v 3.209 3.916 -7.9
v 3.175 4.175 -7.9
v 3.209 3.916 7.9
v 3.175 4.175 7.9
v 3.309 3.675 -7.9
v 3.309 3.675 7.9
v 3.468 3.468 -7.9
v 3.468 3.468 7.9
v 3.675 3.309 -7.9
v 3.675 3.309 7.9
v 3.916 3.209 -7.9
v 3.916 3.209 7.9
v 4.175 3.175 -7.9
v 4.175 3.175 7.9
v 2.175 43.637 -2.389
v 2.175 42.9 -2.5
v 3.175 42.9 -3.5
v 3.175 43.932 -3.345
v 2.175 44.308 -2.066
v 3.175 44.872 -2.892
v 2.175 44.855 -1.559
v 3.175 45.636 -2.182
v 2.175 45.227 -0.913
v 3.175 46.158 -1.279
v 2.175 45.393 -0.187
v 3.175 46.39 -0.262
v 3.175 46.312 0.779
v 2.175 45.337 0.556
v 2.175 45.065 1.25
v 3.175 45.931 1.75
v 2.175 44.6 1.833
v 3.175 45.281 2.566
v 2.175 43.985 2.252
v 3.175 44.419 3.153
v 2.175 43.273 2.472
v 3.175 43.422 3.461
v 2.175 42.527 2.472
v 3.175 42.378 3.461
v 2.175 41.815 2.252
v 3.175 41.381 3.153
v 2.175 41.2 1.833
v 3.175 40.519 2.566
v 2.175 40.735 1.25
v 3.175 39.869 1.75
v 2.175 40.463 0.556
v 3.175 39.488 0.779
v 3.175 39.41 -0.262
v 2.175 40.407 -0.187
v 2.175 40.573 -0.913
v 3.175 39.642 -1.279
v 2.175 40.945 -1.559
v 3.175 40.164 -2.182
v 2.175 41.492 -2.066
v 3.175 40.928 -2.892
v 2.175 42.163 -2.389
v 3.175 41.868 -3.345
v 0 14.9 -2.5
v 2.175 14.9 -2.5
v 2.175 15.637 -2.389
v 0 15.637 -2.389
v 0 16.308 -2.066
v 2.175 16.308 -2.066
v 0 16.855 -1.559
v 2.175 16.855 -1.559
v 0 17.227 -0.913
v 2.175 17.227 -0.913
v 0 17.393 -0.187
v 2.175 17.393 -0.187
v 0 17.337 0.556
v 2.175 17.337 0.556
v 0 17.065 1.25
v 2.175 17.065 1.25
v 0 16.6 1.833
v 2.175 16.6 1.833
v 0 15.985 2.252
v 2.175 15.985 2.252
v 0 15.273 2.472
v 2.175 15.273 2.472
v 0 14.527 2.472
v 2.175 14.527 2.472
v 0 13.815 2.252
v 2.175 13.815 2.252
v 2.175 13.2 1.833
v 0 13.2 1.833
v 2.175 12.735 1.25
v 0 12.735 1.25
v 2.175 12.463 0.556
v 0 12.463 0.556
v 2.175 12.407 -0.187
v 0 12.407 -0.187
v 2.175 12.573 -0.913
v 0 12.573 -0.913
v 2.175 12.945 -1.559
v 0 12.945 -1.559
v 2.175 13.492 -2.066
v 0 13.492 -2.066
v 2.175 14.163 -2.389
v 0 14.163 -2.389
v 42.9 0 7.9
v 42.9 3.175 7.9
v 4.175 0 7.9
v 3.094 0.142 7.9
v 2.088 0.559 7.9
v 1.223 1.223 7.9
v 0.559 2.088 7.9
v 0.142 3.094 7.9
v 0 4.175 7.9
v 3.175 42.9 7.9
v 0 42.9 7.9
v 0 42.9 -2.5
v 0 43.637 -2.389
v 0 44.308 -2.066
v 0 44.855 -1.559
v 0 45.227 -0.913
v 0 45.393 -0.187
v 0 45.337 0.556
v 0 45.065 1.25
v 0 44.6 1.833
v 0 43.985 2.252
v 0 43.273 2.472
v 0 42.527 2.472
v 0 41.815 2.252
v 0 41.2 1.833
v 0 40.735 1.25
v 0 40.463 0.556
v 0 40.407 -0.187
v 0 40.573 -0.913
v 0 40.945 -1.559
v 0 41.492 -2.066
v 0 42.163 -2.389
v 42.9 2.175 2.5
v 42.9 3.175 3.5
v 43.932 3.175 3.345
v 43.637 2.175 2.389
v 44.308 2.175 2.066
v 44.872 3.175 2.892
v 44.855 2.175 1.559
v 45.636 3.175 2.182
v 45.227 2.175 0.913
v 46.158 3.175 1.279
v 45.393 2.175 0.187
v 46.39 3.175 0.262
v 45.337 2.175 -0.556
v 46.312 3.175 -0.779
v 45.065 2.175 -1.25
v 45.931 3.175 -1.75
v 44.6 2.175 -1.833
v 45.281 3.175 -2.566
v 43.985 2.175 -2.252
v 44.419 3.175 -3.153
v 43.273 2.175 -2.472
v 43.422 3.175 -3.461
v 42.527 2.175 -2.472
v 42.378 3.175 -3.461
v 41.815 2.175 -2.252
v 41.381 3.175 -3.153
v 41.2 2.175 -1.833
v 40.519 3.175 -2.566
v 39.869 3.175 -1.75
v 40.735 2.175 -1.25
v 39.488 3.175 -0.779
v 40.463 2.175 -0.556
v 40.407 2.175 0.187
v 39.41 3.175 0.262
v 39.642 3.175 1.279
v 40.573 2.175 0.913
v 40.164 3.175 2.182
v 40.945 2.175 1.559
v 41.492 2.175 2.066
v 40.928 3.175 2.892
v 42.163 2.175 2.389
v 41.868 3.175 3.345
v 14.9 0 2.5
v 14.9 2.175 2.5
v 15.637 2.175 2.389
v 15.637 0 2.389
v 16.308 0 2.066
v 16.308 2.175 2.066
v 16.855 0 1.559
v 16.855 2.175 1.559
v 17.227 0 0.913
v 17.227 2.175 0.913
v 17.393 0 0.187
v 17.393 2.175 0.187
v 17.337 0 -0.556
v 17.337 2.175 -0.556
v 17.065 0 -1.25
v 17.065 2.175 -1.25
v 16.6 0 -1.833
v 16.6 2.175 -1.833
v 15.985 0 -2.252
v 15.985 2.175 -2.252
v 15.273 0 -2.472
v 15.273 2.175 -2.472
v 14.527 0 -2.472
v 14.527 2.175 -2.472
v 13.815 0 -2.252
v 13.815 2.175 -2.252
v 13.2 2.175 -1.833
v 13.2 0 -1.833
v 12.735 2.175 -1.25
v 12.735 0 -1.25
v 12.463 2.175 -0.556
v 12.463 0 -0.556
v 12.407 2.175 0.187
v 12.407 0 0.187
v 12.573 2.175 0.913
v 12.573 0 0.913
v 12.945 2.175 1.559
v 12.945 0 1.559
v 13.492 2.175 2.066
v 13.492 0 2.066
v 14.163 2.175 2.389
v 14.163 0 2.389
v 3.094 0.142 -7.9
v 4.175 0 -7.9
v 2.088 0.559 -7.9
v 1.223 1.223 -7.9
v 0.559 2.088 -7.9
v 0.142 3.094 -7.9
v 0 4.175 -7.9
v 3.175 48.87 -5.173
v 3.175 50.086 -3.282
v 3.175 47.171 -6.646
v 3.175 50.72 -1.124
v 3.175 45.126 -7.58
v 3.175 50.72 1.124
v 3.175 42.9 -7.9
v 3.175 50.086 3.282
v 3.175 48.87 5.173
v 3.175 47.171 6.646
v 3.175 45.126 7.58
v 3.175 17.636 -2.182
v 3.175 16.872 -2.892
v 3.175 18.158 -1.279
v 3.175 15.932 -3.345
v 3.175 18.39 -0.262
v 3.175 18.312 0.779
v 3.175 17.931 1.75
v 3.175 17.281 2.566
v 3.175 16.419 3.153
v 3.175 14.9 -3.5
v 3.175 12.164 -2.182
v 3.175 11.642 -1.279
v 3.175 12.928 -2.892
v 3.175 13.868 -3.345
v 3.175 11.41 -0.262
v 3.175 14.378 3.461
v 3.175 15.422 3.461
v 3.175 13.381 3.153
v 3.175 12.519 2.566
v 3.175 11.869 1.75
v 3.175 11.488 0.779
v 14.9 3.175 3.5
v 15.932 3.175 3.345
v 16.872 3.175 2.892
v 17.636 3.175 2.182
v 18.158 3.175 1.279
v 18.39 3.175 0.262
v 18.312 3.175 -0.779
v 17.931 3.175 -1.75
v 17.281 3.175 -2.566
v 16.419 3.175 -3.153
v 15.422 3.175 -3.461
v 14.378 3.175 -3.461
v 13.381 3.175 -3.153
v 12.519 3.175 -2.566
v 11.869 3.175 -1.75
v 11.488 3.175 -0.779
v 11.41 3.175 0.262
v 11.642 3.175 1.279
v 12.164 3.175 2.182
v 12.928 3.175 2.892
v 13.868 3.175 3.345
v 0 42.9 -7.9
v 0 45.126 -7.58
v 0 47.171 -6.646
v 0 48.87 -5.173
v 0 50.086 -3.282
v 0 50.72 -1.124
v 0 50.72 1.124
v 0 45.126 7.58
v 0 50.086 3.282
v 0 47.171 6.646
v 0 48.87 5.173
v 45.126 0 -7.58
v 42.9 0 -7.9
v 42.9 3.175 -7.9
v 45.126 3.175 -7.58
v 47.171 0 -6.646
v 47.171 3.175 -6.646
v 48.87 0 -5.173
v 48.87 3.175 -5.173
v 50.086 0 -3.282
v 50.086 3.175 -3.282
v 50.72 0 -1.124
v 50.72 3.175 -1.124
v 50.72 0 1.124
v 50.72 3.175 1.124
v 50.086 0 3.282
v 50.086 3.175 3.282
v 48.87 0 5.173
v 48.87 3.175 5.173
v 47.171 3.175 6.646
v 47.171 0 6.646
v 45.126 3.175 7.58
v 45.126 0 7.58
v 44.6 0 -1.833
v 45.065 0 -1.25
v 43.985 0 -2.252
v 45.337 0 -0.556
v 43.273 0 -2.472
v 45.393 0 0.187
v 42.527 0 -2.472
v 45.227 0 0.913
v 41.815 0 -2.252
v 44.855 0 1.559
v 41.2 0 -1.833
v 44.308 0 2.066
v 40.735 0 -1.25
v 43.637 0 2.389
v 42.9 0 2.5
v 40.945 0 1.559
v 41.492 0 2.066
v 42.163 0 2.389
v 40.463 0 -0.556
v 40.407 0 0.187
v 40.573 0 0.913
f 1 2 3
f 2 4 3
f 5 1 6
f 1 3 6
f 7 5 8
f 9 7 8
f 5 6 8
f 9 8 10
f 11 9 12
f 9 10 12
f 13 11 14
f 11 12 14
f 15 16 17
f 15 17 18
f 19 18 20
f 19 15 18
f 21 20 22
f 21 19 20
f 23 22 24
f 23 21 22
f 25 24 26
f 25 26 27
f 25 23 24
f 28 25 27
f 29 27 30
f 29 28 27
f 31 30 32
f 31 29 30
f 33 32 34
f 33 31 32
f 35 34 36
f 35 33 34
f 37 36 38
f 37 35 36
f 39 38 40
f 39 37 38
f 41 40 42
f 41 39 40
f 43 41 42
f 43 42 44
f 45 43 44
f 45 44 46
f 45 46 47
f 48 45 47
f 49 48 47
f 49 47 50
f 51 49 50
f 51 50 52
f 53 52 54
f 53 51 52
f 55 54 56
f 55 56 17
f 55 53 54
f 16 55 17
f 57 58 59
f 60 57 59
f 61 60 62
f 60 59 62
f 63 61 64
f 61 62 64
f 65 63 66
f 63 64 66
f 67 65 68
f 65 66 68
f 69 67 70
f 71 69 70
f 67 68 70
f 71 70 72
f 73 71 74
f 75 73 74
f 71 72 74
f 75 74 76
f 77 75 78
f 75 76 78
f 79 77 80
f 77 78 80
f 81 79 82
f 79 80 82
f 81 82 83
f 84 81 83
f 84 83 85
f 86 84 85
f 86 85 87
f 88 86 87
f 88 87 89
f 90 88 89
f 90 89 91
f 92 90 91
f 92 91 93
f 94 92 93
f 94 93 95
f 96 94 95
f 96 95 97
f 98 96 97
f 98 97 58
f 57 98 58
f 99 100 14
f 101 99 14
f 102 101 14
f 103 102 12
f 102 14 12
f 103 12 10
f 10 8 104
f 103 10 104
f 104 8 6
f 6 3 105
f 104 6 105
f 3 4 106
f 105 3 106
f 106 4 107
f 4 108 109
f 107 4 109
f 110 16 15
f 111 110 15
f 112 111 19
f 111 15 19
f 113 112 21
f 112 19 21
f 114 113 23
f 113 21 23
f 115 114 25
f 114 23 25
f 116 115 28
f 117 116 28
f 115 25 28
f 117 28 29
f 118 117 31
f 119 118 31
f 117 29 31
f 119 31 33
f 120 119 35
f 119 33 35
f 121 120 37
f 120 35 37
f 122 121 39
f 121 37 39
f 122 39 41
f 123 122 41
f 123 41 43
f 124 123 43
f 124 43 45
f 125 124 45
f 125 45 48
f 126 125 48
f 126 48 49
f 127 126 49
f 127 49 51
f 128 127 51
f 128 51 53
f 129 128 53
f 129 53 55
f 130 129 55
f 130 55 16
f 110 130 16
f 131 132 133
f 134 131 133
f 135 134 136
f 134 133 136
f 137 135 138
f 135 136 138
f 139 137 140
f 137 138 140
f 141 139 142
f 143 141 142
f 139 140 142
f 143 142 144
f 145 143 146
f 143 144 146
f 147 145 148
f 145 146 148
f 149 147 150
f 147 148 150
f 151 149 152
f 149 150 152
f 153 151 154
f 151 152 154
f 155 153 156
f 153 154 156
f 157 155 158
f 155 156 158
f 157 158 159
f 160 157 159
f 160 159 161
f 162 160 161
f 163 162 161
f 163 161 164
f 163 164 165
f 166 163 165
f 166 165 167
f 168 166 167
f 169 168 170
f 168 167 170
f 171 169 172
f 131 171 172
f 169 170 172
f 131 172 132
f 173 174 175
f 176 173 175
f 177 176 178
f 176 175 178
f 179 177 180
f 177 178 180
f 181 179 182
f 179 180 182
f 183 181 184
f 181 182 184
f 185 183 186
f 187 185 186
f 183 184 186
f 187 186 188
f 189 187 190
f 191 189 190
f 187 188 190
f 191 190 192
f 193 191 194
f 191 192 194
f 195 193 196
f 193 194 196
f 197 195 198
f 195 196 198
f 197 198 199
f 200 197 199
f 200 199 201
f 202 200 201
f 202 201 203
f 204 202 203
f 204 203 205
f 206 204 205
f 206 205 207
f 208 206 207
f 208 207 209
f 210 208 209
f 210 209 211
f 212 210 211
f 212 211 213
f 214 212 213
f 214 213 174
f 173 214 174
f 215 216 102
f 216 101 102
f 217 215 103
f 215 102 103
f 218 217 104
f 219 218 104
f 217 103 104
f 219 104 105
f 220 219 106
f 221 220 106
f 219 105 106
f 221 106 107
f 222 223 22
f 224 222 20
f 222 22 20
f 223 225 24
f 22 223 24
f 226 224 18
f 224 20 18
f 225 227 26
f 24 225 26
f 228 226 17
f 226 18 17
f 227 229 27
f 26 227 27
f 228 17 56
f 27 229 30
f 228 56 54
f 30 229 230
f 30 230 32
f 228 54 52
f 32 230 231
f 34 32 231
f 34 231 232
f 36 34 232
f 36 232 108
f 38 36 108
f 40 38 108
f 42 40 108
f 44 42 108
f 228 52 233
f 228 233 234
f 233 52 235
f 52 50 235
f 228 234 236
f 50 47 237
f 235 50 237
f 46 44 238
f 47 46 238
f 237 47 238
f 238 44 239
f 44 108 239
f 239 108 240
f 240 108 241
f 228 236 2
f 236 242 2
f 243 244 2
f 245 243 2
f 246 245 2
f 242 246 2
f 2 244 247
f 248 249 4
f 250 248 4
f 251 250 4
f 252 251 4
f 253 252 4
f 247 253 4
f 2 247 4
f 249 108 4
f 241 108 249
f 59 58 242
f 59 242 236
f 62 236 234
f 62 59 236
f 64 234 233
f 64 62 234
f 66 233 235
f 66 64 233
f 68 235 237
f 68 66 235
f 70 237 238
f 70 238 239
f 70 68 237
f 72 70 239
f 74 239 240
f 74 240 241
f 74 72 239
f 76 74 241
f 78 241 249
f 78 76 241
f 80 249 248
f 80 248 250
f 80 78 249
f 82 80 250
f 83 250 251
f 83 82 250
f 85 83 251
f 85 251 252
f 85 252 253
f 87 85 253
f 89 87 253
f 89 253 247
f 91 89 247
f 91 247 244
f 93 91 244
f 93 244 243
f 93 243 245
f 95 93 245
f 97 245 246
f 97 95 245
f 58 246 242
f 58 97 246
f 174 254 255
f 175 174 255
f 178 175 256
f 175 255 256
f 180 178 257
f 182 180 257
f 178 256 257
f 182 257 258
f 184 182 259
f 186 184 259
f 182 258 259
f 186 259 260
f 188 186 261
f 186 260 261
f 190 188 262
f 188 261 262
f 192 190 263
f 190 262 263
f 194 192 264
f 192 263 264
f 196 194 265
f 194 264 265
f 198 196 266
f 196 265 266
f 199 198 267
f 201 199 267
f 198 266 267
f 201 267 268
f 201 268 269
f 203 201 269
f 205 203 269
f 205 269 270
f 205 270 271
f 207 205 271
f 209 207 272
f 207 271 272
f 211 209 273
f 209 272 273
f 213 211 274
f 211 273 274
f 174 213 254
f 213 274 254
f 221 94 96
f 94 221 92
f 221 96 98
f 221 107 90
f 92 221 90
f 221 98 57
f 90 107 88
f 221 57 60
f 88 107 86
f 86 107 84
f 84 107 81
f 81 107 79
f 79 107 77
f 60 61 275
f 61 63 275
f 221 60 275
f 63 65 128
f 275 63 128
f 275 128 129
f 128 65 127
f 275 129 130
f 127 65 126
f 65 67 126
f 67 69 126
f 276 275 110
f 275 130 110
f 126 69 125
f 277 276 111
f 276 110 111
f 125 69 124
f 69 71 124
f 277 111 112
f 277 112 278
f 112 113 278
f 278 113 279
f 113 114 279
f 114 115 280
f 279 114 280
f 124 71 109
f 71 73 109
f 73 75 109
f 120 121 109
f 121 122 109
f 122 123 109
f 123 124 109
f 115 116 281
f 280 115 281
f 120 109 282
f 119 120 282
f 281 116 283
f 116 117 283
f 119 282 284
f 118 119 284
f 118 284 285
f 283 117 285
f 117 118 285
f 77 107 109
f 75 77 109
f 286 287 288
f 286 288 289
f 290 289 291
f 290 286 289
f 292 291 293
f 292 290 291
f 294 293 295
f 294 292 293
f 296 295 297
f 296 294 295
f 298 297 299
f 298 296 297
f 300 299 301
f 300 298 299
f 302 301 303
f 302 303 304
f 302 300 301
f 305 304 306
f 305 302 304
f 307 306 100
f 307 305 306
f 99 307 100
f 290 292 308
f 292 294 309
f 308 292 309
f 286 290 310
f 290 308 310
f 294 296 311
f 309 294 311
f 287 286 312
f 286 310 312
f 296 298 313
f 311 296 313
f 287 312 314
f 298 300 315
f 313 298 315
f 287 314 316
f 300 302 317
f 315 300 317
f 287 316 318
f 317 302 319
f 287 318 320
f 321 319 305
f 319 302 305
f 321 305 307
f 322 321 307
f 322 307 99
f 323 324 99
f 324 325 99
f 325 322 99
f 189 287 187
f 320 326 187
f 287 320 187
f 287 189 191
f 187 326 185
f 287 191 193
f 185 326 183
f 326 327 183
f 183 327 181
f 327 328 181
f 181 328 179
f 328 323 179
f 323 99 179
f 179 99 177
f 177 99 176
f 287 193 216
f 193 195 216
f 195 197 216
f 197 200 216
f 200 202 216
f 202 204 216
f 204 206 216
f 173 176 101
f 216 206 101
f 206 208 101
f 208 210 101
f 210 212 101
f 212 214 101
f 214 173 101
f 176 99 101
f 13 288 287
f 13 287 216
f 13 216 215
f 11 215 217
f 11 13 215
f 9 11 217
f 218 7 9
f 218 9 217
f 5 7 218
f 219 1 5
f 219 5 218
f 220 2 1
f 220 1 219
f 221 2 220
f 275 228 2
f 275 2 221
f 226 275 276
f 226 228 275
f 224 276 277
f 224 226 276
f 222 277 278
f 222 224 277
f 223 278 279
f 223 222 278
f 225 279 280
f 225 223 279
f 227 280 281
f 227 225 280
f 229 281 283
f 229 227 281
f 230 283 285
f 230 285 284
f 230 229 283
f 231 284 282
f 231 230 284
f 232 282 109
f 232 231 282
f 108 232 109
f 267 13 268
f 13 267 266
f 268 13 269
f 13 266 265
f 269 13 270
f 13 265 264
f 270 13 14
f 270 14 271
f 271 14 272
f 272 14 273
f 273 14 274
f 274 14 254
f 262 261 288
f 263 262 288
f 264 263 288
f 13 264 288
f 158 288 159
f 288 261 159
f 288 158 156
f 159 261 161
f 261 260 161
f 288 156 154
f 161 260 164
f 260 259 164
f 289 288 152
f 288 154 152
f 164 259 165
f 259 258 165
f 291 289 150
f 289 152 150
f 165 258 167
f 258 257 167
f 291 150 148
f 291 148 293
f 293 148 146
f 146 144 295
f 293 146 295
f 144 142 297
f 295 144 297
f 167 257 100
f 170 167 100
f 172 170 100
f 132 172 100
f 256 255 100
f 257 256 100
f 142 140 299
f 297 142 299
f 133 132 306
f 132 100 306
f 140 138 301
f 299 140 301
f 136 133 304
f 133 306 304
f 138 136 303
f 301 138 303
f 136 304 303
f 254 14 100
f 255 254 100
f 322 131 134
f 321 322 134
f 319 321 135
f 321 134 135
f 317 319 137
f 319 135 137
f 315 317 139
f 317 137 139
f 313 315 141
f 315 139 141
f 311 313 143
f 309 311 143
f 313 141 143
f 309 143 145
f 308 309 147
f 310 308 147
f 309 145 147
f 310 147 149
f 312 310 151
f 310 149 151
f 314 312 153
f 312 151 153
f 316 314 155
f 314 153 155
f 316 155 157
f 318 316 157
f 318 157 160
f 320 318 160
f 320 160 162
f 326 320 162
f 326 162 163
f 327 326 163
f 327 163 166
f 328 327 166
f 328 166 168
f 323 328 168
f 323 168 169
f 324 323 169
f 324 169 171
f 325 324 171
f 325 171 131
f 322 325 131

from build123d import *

# Parameters (mm, degrees)
FLANGE_BASE1_DEPTH    = 7.9
FILETE2_RADIUS        = 7.9
FILETE2_LENGTH        = 3.175
FILETE4_RADIUS        = 7.9
FILETE4_LENGTH        = 3.175
ESBO_O6_R             = 2.5
CORTE_EXTRUS_O1_DEPTH = 71.07988745
ESBO_O7_R             = 2.5
CORTE_EXTRUS_O2_DEPTH = 71.07988745
CHANFRO2_SIZE         = 1


# Sheet-metal steps are written as plain solids
with BuildPart() as part:
    # Esboço1 → Flange-base1 (new, symmetric)
    with BuildSketch(Plane.XY):
        with BuildLine():
            Line((50.8, 0), (4.175, 0))
            ThreePointArc((4.175, 0), (1.222829189, 1.222829189), (0, 4.175))
            Line((0, 4.175), (0, 50.8))
            Line((0, 50.8), (3.175, 50.8))
            Line((3.175, 50.8), (3.175, 4.175))
            ThreePointArc((3.175, 4.175), (3.467893219, 3.467893219), (4.175, 3.175))
            Line((4.175, 3.175), (50.8, 3.175))
            Line((50.8, 3.175), (50.8, 0))
        make_face()
    extrude(amount=FLANGE_BASE1_DEPTH, both=True)

    # Filete2: full round fillet: the end face becomes a half cylinder, R = half its width
    filete2_face = Plane((1.5875, 50.8, 0), x_dir=(1, 0, 0), z_dir=(0, 1, 0))  # on the end face: x along it, z out of the body
    filete2_slab = filete2_face.offset(-FILETE2_RADIUS / 2) * Box(FILETE2_LENGTH, 2 * FILETE2_RADIUS, FILETE2_RADIUS, mode=Mode.PRIVATE)  # the body's end, R deep
    filete2_round = Plane((1.5875, 42.9, 0), x_dir=(0, 1, 0), z_dir=(1, 0, 0)) * Cylinder(FILETE2_RADIUS, FILETE2_LENGTH, mode=Mode.PRIVATE)  # its axis R under the face
    add(filete2_slab - filete2_round, mode=Mode.SUBTRACT)

    # Filete4: full round fillet: the end face becomes a half cylinder, R = half its width
    filete4_face = Plane((50.8, 1.5875, 0), x_dir=(0, -1, 0), z_dir=(1, 0, 0))  # on the end face: x along it, z out of the body
    filete4_slab = filete4_face.offset(-FILETE4_RADIUS / 2) * Box(FILETE4_LENGTH, 2 * FILETE4_RADIUS, FILETE4_RADIUS, mode=Mode.PRIVATE)  # the body's end, R deep
    filete4_round = Plane((42.9, 1.5875, 0), x_dir=(1, 0, 0), z_dir=(0, -1, 0)) * Cylinder(FILETE4_RADIUS, FILETE4_LENGTH, mode=Mode.PRIVATE)  # its axis R under the face
    add(filete4_slab - filete4_round, mode=Mode.SUBTRACT)

    # Esboço6 → Corte-extrusão1 (cut, through all)
    with BuildSketch(Plane(origin=(0, 3.175, 0), x_dir=(1, 0, 0), z_dir=(0, 1, 0))):
        with Locations(Location((14.9, 0, 0), (0, 0, 270))):
            Circle(ESBO_O6_R)
        with Locations(Location((42.9, 0, 0), (0, 0, 270))):
            Circle(ESBO_O6_R)
    extrude(amount=-CORTE_EXTRUS_O1_DEPTH, mode=Mode.SUBTRACT)

    # Esboço7 → Corte-extrusão2 (cut, through all)
    with BuildSketch(Plane(origin=(3.175, 0, 0), x_dir=(0, 0, -1), z_dir=(1, 0, 0))):
        with Locations((0, 42.9)):
            Circle(ESBO_O7_R)
        with Locations((0, 14.9)):
            Circle(ESBO_O7_R)
    extrude(amount=-CORTE_EXTRUS_O2_DEPTH, mode=Mode.SUBTRACT)

    # Chanfro2
    chanfro2_edges = [part.edges().sort_by_distance(p)[0] for p in [
        (42.9, 3.175, -2.5),
        (14.9, 3.175, -2.5),
        (3.175, 42.9, 2.5),
        (3.175, 14.9, 2.5),
    ]]
    chamfer(chanfro2_edges, length=CHANFRO2_SIZE)


solid = part.part
